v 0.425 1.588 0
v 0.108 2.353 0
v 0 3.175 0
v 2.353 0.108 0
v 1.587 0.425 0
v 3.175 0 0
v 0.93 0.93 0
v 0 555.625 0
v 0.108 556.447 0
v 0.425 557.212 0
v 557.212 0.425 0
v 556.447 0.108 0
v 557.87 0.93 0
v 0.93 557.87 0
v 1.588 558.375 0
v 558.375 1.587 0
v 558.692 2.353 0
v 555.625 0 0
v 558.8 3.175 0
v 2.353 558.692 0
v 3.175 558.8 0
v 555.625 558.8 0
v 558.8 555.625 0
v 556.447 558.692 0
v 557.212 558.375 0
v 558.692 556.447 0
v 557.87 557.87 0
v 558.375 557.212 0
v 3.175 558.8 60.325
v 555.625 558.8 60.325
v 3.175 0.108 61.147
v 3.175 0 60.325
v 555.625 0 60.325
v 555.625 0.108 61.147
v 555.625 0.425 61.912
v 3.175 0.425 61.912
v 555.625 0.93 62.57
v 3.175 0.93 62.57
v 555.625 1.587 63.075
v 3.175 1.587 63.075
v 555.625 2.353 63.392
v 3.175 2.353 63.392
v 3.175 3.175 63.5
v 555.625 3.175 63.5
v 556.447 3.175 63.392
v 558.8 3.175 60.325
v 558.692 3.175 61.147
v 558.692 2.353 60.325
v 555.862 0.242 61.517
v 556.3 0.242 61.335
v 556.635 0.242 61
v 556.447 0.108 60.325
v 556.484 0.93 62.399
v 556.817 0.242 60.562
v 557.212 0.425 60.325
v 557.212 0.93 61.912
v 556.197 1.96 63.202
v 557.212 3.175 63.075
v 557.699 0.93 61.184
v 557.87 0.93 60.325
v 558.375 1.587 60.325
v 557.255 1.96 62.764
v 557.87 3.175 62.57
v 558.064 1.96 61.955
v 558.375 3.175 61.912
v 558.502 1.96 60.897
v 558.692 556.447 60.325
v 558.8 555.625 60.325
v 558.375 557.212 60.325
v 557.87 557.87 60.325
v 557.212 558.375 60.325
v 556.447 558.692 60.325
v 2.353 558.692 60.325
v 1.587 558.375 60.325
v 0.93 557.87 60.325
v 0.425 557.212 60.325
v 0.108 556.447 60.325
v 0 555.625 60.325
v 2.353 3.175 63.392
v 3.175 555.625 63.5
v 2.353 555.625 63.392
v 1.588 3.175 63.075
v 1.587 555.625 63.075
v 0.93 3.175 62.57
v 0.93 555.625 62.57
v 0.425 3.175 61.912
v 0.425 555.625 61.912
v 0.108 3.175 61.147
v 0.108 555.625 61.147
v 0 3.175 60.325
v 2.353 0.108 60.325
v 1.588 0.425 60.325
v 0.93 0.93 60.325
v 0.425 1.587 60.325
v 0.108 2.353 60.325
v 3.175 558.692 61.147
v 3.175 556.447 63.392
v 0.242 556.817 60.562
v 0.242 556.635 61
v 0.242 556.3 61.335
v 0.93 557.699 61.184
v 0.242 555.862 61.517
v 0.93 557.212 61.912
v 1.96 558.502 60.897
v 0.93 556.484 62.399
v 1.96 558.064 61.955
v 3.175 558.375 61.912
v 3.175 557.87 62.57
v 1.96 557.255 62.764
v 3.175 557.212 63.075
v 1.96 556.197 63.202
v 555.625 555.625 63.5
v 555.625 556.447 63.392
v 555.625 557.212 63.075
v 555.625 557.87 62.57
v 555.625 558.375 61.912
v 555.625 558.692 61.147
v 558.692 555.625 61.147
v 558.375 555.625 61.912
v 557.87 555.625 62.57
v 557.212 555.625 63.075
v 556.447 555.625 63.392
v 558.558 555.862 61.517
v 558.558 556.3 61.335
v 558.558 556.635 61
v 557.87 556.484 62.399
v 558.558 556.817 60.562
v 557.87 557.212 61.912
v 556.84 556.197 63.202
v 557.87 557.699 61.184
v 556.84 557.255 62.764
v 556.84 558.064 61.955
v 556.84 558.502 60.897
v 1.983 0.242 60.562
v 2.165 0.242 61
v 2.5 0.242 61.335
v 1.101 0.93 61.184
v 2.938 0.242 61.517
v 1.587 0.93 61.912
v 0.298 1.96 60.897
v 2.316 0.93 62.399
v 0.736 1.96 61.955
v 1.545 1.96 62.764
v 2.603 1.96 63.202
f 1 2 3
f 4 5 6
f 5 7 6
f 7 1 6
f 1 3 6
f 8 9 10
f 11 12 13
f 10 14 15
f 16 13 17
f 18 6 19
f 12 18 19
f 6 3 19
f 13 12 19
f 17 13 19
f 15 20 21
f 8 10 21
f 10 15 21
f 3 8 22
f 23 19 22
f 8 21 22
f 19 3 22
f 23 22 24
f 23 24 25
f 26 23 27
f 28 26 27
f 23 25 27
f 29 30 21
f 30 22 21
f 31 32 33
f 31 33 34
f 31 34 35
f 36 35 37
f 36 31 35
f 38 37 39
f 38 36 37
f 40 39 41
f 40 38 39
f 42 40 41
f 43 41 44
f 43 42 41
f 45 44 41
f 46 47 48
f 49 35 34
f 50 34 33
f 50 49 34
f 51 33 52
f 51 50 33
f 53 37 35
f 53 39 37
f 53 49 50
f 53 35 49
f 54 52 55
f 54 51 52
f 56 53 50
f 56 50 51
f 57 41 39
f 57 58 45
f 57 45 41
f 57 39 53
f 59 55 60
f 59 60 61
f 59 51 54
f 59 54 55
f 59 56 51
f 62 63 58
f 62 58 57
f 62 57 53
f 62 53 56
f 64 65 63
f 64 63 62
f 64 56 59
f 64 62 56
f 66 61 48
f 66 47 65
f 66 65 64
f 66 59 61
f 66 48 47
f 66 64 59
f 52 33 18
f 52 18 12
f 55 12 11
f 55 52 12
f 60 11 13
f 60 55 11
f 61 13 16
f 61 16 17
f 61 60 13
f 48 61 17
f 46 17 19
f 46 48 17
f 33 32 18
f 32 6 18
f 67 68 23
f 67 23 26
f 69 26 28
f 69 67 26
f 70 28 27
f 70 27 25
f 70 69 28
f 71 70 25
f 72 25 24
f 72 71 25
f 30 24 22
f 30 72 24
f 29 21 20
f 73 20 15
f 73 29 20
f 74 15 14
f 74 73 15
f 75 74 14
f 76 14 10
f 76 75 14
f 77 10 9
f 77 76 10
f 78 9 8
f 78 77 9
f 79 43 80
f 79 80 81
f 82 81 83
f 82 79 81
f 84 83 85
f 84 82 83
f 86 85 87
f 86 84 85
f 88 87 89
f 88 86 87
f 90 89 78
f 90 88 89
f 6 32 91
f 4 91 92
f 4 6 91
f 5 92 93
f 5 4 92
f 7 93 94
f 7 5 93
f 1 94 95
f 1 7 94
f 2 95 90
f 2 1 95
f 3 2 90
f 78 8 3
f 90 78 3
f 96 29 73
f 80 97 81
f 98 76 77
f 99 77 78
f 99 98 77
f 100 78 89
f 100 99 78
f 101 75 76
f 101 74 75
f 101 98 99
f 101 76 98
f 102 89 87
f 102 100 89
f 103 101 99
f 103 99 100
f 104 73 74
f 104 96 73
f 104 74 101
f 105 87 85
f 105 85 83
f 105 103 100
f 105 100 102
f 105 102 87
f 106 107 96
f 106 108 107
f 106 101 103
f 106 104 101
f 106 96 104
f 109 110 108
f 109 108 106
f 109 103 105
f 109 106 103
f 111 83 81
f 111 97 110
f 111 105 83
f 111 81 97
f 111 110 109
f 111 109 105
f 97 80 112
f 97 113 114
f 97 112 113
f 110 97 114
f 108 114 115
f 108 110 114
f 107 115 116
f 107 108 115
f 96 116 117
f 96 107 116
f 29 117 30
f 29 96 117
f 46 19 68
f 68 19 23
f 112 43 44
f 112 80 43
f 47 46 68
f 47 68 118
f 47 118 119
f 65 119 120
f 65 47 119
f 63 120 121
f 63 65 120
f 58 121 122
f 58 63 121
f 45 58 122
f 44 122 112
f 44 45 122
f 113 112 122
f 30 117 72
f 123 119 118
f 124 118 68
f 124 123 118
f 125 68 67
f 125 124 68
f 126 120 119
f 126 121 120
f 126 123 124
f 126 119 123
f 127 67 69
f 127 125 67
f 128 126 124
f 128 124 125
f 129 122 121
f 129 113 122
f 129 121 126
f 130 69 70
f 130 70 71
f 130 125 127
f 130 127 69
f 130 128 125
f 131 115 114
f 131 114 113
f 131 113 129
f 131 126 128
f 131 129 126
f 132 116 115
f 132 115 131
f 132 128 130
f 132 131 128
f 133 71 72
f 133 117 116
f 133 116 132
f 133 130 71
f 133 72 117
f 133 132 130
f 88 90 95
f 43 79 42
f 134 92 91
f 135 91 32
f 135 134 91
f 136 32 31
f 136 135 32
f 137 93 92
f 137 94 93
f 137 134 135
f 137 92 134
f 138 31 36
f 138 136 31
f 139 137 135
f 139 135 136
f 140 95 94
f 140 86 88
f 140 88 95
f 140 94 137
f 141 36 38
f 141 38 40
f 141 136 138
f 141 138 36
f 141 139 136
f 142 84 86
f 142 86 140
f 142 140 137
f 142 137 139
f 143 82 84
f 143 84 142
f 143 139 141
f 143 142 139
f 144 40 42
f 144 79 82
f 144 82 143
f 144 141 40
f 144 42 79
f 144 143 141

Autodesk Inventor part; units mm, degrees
ref_plane "YZ Plane" through (0, 0, 0) normal (1, 0, 0) x (0, 1, 0)
ref_plane "XZ Plane" through (0, 0, 0) normal (0, 1, 0) x (-1, 0, 0)
ref_plane "XY Plane" through (0, 0, 0) normal (0, 0, 1) x (1, 0, 0)
sketch "Sketch1" plane through (0, 0, 0) normal (0, 0, 1) x (1, 0, 0)
  line L0 (0, 0) -> (558.8, 0)
  line L1 (558.8, 0) -> (558.8, 558.8)
  line L2 (558.8, 558.8) -> (0, 558.8)
  line L3 (0, 558.8) -> (0, 0)
  dimension "d0" = 558.8
  dimension "d1" = 558.8
extrude "Extrusion1" add sketch "Sketch1" along normal blind 63.5
fillet "Fillet1" radius 3.175 1 edges at (279.4, 558.8, 63.5)
fillet "Fillet2" radius 3.175 3 edges at (0, 557.8701, 62.5701) (0, 558.8, 30.1625) (0, 277.8125, 63.5)
fillet "Fillet3" radius 3.175 3 edges at (558.8, 557.8701, 62.5701) (558.8, 558.8, 30.1625) (558.8, 277.8125, 63.5)
fillet "Fillet4" radius 3.175 5 edges at (557.8701, 0, 62.5701) (558.8, 0, 30.1625) (0.9299, 0, 62.5701) (0, 0, 30.1625) (279.4, 0, 63.5)
sketch "Sketch2" plane through (0, 0, 63.5) normal (0, 0, 1) x (1, 0, 0)
  line L0 (555.625, 3.175) -> (3.175, 3.175) projected
  line L1 (555.625, 555.625) -> (555.625, 3.175) projected
  line L2 (3.175, 555.625) -> (555.625, 555.625) projected
  line L3 (3.175, 3.175) -> (3.175, 555.625) projected
  line L4 (79.375, 79.375) -> (79.375, 479.425)
  line L5 (79.375, 479.425) -> (479.425, 479.425)
  line L6 (479.425, 479.425) -> (479.425, 79.375)
  line L7 (479.425, 79.375) -> (79.375, 79.375)
  line L8 (129.3812, 479.425) -> (129.3812, 79.375)
  line L9 (429.4187, 479.425) -> (429.4187, 79.375)
  line L10 (379.4125, 479.425) -> (379.4125, 79.375)
  line L11 (179.3875, 479.425) -> (179.3875, 79.375)
  line L12 (229.3937, 479.425) -> (229.3937, 79.375)
  line L13 (329.4062, 479.425) -> (329.4062, 79.375)
  line L14 (279.4, 479.425) -> (279.4, 79.375)
  line L15 (79.375, 129.3813) -> (479.425, 129.3813)
  line L16 (79.375, 179.3875) -> (479.425, 179.3875)
  line L17 (79.375, 429.4188) -> (479.425, 429.4188)
  line L18 (79.375, 379.4125) -> (479.425, 379.4125)
  line L19 (79.375, 329.4063) -> (479.425, 329.4063)
  line L20 (79.375, 279.4) -> (479.425, 279.4)
  line L21 (79.375, 229.3938) -> (479.425, 229.3938)
  line L22 (53.975, 504.825) -> (504.825, 504.825)
  line L23 (504.825, 504.825) -> (504.825, 53.975)
  line L24 (504.825, 53.975) -> (53.975, 53.975)
  line L25 (53.975, 53.975) -> (53.975, 504.825)
  line L26 (134.4612, 479.425) -> (134.4612, 79.375)
  line L27 (129.3812, 479.425) -> (129.3812, 79.375)
  line L28 (174.3075, 479.425) -> (174.3075, 79.375)
  line L29 (184.4675, 479.425) -> (184.4675, 79.375)
  line L30 (224.3137, 479.425) -> (224.3137, 79.375)
  line L31 (234.4737, 479.425) -> (234.4737, 79.375)
  line L32 (274.32, 479.425) -> (274.32, 79.375)
  line L33 (284.48, 479.425) -> (284.48, 79.375)
  line L34 (324.3262, 479.425) -> (324.3262, 79.375)
  line L35 (334.4862, 479.425) -> (334.4862, 79.375)
  line L36 (374.3325, 479.425) -> (374.3325, 79.375)
  line L37 (384.4925, 479.425) -> (384.4925, 79.375)
  line L38 (424.3387, 479.425) -> (424.3387, 79.375)
  line L39 (434.4987, 479.425) -> (434.4987, 79.375)
  line L40 (479.425, 124.3013) -> (79.375, 124.3013)
  line L41 (79.375, 134.4613) -> (479.425, 134.4613)
  line L42 (479.425, 174.3075) -> (79.375, 174.3075)
  line L43 (79.375, 184.4675) -> (479.425, 184.4675)
  line L44 (479.425, 224.3138) -> (79.375, 224.3138)
  line L45 (79.375, 234.4737) -> (479.425, 234.4738)
  line L46 (479.425, 274.32) -> (79.375, 274.32)
  line L47 (79.375, 284.48) -> (479.425, 284.48)
  line L48 (479.425, 324.3263) -> (79.375, 324.3263)
  line L49 (479.425, 334.4863) -> (79.375, 334.4863)
  line L50 (79.375, 374.3325) -> (479.425, 374.3325)
  line L51 (479.425, 384.4925) -> (79.375, 384.4925)
  line L52 (79.375, 424.3388) -> (479.425, 424.3388)
  line L53 (479.425, 434.4988) -> (79.375, 434.4988)
  line L54 (124.3012, 479.425) -> (124.3012, 79.375)
  point P0 (0, 0)
  dimension "d12" = 50.0063
  dimension "d13" = 50.0063
  dimension "d14" = 50.0063
  dimension "d15" = 50.0063
  dimension "d16" = 50.0063
  dimension "d17" = 50.0063
  dimension "d18" = 50.0063
  dimension "d19" = 50.0063
  dimension "d20" = 50.0063
  dimension "d21" = 50.0063
  dimension "d22" = 50.0063
  dimension "d23" = 50.0063
  dimension "d24" = 50.0063
  dimension "d25" = 50.0063
  dimension "d26" = 50.0063
  dimension "d27" = 50.0063
  dimension "d28" = 25.4
  dimension "d29" = 25.4
  dimension "d30" = 25.4
  dimension "d31" = 25.4
  dimension "d32" = 50.8
  dimension "d33" = 50.8
  dimension "d34" = 50.8
  dimension "d35" = 50.8
  dimension "d36" = 5.08
  dimension "d37" = 5.08
  dimension "d38" = 5.08
  dimension "d39" = 5.08
  dimension "d40" = 5.08
  dimension "d41" = 5.08
  dimension "d42" = 5.08
  dimension "d43" = 5.08
  dimension "d44" = 5.08
  dimension "d45" = 5.08
  dimension "d46" = 5.08
  dimension "d47" = 5.08
  dimension "d48" = 5.08
  dimension "d49" = 5.08
  dimension "d50" = 5.08
  dimension "d51" = 5.08
  dimension "d52" = 5.08
  dimension "d53" = 5.08
  dimension "d54" = 5.08
  dimension "d55" = 5.08
  dimension "d56" = 5.08
  dimension "d57" = 5.08
  dimension "d58" = 5.08
  dimension "d59" = 5.08
  dimension "d60" = 5.08
  dimension "d61" = 5.08
  dimension "d62" = 5.08
  dimension "d63" = 39.8462
  dimension "d64" = 39.8462
  dimension "d65" = 5.08
sketch "Sketch3" plane through (0, 0, 63.5) normal (0, 0, 1) x (1, 0, 0)
  point P0 (0, 0)
equation "\"d13\" = d12"
equation "\"d14\" = d12"
equation "\"d15\" = d12"
equation "\"d16\" = d12"
equation "\"d17\" = d12"
equation "\"d18\" = d12"
equation "\"d20\" = d12"
equation "\"d21\" = d12"
equation "\"d22\" = d12"
equation "\"d23\" = d12"
equation "\"d24\" = d12"
equation "\"d25\" = d12"
equation "\"d26\" = d12"
equation "\"d37\" = d36"
equation "\"d38\" = d36"
equation "\"d39\" = d36"
equation "\"d40\" = d39"
equation "\"d41\" = d39"
equation "\"d42\" = d41"
equation "\"d43\" = d41"
equation "\"d44\" = d41"
equation "\"d45\" = d43"
equation "\"d46\" = d45"
equation "\"d47\" = d45"
equation "\"d48\" = d47"
equation "\"d49\" = d48"
equation "\"d50\" = d49"
equation "\"d51\" = d49"
equation "\"d52\" = d49"
equation "\"d53\" = d52"
equation "\"d54\" = d51"
equation "\"d55\" = d53"
equation "\"d56\" = d55"
equation "\"d57\" = d55"
equation "\"d58\" = d56"
equation "\"d59\" = d57"
equation "\"d60\" = d57"
equation "\"d61\" = d60"
equation "\"d62\" = d59"
properties part number "chess-board"
